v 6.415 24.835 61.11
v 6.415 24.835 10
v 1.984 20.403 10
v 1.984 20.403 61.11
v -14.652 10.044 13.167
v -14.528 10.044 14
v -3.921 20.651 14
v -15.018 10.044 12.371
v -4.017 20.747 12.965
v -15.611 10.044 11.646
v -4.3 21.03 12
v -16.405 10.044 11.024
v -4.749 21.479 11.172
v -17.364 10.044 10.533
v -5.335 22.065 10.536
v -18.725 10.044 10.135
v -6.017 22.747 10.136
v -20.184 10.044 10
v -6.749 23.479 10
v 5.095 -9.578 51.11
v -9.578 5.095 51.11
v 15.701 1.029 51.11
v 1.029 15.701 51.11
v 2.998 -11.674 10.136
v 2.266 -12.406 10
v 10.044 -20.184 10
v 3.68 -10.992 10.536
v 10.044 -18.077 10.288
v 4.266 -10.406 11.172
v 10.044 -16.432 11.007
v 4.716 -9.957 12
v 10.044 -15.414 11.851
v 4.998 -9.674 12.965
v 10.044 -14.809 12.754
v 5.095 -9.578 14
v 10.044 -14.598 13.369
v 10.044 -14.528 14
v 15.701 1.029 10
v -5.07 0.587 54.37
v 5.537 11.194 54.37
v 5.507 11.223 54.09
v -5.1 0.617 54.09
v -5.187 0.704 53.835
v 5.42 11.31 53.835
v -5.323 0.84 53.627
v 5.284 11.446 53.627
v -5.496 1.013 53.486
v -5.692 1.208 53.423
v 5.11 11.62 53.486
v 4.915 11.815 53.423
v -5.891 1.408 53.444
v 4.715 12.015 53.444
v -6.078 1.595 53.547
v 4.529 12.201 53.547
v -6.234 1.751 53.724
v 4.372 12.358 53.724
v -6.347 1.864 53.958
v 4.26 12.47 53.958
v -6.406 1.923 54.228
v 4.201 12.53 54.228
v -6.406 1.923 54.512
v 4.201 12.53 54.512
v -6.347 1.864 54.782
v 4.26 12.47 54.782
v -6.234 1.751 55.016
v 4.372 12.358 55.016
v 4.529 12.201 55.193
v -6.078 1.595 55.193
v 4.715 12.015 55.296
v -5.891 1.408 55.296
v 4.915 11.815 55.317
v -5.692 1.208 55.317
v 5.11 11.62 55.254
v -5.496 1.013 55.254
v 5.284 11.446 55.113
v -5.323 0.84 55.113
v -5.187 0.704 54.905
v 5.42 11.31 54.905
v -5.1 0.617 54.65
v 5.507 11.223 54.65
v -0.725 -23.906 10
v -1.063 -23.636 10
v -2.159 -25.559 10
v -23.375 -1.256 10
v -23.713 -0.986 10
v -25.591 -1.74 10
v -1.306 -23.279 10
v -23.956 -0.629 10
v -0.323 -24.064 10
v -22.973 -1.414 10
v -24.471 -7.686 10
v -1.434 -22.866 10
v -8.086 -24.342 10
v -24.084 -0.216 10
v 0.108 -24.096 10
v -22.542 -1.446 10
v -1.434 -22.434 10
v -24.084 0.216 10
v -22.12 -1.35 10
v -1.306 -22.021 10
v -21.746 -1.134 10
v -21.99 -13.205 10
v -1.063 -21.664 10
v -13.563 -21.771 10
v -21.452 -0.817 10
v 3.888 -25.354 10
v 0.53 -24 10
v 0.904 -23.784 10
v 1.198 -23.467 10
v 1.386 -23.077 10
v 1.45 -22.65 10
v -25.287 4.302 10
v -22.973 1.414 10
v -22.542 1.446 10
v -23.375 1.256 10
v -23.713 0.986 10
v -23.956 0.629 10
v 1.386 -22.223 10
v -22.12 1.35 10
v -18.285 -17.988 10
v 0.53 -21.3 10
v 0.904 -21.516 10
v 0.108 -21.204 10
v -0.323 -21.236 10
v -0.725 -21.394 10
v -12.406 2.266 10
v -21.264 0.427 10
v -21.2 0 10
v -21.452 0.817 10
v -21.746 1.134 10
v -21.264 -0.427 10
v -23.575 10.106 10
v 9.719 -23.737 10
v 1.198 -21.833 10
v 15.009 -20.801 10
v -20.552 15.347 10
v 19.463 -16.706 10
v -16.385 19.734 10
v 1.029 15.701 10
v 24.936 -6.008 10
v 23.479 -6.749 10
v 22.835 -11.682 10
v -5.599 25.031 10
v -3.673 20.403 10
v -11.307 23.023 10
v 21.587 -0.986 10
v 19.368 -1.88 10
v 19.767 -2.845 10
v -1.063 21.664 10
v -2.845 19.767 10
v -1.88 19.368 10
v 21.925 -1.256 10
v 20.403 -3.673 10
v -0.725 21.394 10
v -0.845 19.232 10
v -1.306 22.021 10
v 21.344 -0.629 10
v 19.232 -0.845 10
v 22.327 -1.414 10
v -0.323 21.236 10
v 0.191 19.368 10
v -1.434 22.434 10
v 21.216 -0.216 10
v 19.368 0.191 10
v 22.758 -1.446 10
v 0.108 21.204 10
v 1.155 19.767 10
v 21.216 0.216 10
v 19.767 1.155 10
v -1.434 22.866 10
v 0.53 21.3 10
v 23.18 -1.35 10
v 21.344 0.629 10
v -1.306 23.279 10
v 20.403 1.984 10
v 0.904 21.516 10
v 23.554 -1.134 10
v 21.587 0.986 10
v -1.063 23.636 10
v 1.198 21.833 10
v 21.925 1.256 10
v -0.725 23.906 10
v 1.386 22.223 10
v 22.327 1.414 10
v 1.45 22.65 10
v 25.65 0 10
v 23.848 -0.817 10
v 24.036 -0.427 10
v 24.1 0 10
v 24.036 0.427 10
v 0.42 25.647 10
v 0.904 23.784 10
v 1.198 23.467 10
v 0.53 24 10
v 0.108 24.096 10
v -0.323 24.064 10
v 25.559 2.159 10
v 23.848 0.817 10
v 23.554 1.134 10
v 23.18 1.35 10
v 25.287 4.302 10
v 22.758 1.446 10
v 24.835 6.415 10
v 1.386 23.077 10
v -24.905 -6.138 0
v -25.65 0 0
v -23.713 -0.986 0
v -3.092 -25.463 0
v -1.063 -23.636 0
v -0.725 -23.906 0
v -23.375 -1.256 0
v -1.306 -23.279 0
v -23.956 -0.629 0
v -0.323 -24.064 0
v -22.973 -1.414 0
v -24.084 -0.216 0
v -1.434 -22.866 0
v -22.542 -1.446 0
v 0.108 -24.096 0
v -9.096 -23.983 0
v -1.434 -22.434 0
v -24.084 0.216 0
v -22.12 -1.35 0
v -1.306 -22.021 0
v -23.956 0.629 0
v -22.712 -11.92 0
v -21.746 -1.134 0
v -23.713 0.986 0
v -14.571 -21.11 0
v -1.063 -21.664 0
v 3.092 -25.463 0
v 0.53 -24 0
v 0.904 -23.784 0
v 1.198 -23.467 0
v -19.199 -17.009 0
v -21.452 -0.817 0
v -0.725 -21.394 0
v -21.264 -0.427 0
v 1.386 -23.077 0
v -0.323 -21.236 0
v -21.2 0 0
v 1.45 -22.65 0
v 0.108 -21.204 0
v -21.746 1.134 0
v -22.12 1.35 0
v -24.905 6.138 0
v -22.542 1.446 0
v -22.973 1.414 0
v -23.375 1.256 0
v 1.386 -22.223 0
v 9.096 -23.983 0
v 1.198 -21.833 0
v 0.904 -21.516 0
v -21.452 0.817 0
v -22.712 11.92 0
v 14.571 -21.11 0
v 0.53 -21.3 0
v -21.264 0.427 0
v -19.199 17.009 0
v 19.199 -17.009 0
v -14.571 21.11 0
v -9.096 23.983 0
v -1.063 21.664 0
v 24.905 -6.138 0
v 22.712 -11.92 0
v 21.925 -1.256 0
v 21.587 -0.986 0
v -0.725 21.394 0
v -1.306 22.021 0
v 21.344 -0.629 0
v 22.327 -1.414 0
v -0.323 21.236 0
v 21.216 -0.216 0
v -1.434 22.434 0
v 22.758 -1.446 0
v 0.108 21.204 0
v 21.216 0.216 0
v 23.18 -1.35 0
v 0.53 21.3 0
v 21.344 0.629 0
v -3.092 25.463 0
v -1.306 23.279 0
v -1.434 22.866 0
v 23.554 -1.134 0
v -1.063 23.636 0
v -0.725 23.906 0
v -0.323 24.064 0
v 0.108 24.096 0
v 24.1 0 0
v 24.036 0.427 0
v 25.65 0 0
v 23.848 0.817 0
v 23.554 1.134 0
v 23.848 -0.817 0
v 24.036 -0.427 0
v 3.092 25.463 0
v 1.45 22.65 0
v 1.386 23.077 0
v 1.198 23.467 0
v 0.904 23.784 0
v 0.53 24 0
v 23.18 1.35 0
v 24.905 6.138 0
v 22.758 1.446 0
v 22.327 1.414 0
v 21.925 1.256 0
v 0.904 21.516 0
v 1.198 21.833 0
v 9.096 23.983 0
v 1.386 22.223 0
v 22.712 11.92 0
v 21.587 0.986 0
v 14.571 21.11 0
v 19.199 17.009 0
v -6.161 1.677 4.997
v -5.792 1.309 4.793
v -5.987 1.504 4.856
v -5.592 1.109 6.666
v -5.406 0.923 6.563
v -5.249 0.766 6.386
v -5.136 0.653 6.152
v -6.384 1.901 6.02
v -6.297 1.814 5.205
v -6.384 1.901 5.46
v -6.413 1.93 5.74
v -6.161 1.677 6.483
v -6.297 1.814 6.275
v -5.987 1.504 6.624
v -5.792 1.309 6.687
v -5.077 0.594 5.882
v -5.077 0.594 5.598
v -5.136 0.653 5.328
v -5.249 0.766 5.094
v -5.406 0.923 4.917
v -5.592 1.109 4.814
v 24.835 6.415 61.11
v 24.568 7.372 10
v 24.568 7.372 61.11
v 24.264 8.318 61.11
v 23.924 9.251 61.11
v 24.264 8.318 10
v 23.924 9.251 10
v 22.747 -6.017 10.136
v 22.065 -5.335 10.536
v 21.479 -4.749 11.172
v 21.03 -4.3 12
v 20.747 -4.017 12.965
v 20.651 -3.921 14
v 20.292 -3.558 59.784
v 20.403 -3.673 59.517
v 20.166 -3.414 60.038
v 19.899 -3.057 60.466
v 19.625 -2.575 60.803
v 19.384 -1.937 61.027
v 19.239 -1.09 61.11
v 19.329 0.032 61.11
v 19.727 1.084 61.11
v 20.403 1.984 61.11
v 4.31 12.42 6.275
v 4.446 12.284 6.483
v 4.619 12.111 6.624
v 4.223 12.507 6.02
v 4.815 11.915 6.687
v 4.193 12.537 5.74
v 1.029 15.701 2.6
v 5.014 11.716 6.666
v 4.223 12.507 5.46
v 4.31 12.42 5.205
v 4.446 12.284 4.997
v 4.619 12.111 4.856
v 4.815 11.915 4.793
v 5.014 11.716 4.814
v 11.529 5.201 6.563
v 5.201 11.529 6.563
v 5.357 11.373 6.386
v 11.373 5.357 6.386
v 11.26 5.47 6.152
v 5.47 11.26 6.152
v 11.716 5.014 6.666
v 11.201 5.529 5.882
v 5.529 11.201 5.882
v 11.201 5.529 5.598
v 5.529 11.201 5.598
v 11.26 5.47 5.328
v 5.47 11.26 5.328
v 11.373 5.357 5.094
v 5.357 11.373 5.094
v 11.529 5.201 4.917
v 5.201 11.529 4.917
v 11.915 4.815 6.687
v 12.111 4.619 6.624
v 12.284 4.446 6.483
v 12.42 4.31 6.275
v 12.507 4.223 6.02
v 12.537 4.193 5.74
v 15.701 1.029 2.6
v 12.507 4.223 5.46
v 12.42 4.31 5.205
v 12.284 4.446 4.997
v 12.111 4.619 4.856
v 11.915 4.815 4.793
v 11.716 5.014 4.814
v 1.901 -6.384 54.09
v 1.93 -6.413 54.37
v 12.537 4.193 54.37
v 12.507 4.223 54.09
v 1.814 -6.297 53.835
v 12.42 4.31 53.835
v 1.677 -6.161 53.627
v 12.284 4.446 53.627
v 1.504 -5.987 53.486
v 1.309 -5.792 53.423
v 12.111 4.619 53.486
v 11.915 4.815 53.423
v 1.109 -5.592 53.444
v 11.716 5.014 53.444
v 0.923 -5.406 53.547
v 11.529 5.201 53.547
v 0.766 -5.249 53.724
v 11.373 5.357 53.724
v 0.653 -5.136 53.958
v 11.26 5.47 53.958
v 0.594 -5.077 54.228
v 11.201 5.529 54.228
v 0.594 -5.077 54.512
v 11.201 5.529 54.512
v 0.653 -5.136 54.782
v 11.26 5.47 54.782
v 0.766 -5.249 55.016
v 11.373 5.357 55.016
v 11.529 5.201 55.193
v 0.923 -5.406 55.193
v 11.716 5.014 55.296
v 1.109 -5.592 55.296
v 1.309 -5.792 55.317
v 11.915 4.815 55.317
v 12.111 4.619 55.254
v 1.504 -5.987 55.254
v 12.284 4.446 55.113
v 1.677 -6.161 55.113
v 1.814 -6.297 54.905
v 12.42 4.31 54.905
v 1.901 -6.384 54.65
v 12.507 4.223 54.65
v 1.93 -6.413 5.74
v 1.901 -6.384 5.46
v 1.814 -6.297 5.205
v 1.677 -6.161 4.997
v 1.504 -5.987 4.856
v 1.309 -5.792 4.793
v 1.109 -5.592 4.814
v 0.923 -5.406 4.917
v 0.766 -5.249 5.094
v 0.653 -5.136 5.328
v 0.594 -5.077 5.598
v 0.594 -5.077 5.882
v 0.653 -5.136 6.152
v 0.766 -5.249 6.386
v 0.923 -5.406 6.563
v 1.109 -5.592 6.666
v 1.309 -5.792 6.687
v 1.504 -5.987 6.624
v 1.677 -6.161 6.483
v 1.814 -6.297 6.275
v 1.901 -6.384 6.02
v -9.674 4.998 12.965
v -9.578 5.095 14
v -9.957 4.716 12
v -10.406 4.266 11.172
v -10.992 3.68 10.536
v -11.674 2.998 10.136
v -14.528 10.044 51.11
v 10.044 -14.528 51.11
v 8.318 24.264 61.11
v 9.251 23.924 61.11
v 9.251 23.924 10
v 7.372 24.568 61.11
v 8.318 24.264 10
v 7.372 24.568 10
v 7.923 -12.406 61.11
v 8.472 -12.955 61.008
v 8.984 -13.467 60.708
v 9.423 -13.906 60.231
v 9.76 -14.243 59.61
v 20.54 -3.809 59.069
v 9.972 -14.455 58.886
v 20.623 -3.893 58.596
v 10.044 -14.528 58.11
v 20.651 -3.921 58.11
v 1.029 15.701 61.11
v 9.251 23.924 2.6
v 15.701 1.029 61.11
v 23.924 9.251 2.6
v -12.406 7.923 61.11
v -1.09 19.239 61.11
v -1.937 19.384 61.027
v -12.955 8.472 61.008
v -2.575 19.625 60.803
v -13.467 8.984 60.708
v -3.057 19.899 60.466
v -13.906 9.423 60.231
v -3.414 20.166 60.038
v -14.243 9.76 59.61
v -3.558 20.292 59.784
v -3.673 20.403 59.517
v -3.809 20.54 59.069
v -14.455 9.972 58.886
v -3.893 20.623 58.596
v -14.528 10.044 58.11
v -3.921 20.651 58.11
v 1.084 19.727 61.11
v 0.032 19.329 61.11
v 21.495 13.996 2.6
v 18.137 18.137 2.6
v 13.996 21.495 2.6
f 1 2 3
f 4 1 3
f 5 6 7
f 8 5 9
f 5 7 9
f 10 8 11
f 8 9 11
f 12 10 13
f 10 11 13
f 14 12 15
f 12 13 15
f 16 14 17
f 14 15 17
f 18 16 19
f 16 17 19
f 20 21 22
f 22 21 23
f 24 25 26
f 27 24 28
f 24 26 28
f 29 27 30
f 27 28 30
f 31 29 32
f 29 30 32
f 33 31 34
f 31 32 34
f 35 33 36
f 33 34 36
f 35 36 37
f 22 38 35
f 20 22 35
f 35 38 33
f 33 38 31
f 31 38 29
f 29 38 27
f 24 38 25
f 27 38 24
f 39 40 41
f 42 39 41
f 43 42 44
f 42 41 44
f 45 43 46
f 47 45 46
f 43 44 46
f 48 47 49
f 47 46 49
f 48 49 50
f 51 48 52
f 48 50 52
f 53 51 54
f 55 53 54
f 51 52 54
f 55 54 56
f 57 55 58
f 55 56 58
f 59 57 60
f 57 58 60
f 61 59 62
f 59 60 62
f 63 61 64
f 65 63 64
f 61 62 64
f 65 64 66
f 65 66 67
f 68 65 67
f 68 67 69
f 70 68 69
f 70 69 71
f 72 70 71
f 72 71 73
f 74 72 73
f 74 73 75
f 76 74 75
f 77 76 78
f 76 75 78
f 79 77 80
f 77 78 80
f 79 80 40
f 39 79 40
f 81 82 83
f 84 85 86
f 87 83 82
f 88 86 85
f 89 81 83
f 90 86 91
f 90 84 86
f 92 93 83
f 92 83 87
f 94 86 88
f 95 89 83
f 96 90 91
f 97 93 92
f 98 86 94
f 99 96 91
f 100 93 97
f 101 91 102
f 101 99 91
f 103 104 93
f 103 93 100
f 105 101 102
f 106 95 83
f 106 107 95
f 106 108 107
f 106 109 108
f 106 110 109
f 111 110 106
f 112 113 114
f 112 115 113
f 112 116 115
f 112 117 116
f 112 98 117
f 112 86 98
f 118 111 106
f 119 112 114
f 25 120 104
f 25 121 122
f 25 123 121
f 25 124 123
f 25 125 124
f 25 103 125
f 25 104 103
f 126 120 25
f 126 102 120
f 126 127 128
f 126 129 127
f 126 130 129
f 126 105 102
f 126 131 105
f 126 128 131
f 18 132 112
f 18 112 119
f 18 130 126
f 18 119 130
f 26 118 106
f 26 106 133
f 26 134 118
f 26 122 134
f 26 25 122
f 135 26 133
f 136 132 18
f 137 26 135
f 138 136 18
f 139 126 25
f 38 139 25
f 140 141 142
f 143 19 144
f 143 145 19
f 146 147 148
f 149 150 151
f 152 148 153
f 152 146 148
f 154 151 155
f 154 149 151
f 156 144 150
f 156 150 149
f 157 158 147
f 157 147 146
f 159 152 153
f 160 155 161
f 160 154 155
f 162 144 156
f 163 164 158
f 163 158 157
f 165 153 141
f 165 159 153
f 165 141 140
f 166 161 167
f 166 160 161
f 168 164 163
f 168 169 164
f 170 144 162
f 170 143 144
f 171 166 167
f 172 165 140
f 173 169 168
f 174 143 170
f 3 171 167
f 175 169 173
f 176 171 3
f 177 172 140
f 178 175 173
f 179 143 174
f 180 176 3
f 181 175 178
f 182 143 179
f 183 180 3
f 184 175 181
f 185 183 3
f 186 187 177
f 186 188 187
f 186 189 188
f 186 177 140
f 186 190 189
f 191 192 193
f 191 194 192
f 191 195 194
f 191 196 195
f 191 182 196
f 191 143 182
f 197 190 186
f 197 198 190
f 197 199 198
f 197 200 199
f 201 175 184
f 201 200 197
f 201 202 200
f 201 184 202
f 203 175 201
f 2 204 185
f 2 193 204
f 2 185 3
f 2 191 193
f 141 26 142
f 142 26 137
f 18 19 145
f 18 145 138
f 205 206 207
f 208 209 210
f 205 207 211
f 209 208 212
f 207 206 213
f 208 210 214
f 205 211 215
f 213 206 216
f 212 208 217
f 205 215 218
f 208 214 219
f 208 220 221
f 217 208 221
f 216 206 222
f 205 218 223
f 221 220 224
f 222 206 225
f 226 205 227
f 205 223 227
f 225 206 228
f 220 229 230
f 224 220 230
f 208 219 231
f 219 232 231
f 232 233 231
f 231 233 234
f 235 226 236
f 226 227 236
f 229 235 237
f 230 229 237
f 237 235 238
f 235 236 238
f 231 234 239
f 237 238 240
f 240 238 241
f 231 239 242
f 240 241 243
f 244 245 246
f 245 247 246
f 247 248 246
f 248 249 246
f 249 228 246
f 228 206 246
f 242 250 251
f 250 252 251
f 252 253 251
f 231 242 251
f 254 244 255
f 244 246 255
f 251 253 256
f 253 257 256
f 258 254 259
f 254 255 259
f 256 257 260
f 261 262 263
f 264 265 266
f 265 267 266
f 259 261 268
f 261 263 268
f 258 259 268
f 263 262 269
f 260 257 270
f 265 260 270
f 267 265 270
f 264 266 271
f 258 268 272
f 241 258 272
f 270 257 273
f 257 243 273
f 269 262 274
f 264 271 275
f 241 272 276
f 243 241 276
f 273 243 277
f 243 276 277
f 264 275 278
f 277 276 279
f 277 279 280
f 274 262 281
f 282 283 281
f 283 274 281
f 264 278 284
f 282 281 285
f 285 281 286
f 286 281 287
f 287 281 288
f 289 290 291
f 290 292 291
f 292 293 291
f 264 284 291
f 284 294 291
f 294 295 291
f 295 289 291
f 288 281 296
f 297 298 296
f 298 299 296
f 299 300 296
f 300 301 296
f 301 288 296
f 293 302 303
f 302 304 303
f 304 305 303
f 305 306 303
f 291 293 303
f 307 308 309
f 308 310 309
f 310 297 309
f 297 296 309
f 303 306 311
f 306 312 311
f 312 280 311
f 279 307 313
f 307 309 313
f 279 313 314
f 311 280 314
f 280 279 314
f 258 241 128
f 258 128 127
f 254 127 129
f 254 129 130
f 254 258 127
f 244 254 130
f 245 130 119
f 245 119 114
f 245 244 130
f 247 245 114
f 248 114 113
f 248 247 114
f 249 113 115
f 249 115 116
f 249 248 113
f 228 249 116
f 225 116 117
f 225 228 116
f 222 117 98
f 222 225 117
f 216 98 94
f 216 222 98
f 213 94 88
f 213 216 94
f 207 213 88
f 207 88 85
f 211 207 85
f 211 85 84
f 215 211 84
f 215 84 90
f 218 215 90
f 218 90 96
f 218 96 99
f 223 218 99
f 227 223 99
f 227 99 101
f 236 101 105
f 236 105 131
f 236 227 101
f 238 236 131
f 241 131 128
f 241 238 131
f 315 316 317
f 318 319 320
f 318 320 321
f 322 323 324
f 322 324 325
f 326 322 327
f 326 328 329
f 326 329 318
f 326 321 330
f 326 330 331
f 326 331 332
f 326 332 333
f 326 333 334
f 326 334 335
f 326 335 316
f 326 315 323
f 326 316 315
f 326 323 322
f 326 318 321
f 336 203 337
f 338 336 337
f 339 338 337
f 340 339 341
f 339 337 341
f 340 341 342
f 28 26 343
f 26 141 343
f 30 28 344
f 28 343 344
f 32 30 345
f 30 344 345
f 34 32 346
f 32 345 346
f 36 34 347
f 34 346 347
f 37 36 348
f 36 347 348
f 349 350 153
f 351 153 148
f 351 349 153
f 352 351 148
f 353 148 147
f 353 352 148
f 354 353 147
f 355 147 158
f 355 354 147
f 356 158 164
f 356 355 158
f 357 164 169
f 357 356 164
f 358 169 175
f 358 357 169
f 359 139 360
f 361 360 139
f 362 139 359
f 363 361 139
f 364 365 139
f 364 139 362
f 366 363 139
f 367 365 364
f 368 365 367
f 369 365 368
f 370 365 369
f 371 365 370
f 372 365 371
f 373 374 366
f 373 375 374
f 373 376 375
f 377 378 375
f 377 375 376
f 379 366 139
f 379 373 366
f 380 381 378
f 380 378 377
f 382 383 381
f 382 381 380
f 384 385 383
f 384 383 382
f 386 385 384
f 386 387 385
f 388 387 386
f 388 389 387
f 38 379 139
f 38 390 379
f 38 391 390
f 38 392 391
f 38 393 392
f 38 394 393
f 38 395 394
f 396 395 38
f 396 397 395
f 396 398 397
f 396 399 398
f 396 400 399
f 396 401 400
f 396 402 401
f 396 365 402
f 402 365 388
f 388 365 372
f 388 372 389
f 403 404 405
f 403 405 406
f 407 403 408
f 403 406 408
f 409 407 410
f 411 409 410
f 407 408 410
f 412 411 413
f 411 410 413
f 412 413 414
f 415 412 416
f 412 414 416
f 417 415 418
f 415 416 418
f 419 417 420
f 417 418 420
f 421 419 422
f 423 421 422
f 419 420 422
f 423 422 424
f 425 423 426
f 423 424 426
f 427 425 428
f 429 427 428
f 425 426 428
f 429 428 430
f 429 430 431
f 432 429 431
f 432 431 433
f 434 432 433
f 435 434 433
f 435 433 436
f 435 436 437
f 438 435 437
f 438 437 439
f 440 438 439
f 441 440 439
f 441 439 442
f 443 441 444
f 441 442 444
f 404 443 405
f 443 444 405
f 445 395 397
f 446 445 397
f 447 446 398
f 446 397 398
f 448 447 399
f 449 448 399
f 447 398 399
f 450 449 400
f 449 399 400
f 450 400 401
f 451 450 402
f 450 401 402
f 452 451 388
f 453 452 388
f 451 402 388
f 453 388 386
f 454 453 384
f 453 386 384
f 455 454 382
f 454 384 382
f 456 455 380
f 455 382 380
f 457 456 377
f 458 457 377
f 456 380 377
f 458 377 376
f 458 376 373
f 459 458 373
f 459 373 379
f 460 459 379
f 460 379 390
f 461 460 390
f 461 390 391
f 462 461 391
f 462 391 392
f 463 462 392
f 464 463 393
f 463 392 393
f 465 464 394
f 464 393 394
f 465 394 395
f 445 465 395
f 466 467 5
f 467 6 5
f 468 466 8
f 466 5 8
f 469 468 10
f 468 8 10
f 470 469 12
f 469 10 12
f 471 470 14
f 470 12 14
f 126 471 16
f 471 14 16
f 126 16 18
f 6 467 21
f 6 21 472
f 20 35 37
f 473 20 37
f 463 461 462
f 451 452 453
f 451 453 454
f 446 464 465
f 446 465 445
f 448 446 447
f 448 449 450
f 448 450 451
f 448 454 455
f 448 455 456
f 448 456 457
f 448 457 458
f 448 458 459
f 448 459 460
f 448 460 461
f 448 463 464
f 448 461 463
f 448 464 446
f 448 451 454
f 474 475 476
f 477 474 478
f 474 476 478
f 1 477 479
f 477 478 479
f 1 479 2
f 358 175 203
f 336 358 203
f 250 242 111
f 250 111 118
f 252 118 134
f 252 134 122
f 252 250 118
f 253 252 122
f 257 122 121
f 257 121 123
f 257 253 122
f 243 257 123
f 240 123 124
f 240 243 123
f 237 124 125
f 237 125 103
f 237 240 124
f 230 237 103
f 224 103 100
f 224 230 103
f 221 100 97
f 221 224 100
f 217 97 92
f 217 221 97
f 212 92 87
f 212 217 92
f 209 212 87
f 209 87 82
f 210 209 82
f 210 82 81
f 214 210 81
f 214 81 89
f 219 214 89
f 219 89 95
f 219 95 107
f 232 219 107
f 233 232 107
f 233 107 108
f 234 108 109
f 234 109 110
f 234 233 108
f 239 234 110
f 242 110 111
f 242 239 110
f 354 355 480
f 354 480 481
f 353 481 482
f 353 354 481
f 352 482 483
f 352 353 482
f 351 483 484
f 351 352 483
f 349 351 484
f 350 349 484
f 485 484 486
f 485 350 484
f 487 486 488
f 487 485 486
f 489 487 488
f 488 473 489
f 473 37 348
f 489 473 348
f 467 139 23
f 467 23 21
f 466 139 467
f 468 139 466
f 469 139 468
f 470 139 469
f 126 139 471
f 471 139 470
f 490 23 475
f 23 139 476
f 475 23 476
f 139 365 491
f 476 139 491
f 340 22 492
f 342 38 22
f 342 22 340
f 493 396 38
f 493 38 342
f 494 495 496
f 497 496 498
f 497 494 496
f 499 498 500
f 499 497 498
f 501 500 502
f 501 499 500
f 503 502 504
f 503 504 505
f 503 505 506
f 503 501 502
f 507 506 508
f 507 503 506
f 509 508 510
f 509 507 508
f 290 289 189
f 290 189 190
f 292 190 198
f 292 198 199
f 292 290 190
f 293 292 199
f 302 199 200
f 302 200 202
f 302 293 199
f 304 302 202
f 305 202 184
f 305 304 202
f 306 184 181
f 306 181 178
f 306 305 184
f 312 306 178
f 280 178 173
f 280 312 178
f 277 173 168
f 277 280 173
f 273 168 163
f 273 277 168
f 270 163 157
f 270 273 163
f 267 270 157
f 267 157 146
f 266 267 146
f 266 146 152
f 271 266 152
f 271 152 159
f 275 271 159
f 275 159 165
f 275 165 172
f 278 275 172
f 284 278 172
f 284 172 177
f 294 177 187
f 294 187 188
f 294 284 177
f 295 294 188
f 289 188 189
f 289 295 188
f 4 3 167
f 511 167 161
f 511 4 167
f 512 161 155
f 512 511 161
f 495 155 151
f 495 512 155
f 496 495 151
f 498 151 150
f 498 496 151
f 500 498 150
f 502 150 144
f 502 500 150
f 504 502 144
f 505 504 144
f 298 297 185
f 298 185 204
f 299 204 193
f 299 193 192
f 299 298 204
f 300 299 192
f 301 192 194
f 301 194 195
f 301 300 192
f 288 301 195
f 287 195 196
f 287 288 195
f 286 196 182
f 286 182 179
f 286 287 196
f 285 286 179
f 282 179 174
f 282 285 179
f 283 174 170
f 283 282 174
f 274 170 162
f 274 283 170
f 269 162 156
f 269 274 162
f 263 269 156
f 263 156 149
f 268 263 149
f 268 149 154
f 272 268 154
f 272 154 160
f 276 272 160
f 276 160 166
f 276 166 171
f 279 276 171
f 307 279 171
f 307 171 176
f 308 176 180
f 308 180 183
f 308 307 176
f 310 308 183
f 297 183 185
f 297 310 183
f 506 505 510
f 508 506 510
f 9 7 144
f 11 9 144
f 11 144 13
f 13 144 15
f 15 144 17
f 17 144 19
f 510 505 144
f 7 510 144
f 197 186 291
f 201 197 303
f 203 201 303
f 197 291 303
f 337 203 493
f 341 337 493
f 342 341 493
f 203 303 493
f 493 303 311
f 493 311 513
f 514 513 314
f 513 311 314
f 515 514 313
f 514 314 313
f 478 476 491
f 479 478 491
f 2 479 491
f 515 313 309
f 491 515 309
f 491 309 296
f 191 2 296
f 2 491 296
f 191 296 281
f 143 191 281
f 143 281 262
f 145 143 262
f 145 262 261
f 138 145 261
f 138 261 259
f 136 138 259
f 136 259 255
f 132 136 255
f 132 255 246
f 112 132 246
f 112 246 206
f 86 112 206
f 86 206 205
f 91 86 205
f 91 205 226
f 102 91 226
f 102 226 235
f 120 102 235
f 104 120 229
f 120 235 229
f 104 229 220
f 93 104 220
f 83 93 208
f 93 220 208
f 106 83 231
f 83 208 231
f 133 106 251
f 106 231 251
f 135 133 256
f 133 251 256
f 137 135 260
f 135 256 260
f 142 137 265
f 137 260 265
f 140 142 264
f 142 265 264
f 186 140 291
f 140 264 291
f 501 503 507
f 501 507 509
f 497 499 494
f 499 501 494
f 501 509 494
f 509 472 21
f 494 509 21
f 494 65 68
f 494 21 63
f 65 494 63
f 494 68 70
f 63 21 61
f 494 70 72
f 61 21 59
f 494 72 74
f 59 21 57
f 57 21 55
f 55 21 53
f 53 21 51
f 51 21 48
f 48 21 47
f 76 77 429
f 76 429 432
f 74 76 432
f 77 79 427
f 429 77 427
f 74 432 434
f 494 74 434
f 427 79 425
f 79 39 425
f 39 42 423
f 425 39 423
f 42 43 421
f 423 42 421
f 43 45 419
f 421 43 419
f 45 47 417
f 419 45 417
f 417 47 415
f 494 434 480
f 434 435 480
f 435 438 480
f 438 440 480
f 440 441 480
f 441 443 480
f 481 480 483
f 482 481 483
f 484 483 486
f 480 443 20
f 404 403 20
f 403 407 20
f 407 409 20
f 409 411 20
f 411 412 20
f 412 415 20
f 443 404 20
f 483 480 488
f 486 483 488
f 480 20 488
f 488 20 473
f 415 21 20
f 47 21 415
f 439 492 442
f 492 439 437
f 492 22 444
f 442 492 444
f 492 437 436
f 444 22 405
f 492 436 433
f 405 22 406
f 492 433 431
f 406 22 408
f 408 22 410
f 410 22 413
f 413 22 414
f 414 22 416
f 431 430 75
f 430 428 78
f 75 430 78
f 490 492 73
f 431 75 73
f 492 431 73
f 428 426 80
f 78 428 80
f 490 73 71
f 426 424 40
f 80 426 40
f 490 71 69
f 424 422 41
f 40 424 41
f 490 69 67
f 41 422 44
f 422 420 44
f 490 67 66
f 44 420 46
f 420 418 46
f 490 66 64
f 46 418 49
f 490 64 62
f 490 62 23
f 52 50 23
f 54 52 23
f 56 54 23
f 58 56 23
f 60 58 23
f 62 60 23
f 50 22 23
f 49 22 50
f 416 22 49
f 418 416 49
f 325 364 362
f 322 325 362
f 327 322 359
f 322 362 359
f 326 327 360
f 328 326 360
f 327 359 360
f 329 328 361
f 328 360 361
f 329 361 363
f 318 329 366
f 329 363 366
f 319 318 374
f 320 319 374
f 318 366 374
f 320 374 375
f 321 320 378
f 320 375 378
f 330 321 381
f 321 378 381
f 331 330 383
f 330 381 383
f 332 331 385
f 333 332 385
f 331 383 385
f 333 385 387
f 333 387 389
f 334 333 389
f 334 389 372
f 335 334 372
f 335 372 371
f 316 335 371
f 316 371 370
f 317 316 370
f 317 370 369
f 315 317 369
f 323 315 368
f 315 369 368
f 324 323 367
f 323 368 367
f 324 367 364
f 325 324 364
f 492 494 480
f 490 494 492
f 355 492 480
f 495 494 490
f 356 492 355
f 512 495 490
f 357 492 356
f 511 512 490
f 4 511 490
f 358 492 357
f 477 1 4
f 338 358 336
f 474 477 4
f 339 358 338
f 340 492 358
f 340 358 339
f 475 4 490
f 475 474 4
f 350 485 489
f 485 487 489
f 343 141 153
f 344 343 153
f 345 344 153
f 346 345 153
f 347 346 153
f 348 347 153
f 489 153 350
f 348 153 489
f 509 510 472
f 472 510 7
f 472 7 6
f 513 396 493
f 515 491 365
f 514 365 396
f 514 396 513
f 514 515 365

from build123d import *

# Parameters (mm, degrees)
SKETCH1_R               = 25.65
SKETCH1_R_2             = 1.45
BOSS_EXTRUDE1_DEPTH     = 10
CUT_EXTRUDE2_DEPTH      = 38.627715849
CUT_EXTRUDE2_DEPTH_BACK = 7.4
SKETCH3_R               = 0.95
CUT_EXTRUDE3_DEPTH      = 15
BOSS_EXTRUDE2_DEPTH     = 41.11
BOSS_EXTRUDE3_DEPTH     = 10
SKETCH6_R               = 0.95
CUT_EXTRUDE4_DEPTH      = 15
FILLET1_R               = 4
BOSS_EXTRUDE4_DEPTH     = 51.11
FILLET2_R               = 4
FILLET3_R               = 3


with BuildPart() as part:
    # Sketch1 → Boss-Extrude1 (new body)
    with BuildSketch(Plane.XY):
        Circle(SKETCH1_R)
        with Locations((0, -22.65)):
            Circle(SKETCH1_R_2, mode=Mode.SUBTRACT)
        with Locations((22.65, 0)):
            Circle(SKETCH1_R_2, mode=Mode.SUBTRACT)
        with Locations((0, 22.65)):
            Circle(SKETCH1_R_2, mode=Mode.SUBTRACT)
        with Locations((-22.65, 0)):
            Circle(SKETCH1_R_2, mode=Mode.SUBTRACT)
    extrude(amount=BOSS_EXTRUDE1_DEPTH)

    # Sketch2 → Cut-Extrude2 (cut, two sides: drawn at the far end of the back side and taken through both)
    with BuildSketch(Plane.XY.offset(10).offset(-CUT_EXTRUDE2_DEPTH_BACK)):
        Polygon((102.061719716, 116.734185426), (9.251139978, 23.923605688), (1.028840367, 15.701306076), (15.701306076, 1.028840367), (23.923605688, 9.251139978), (116.734185426, 102.061719716), (302.355344902, 287.682879192), (287.682879192, 302.355344902), align=None)
    extrude(amount=CUT_EXTRUDE2_DEPTH + CUT_EXTRUDE2_DEPTH_BACK, mode=Mode.SUBTRACT)

    # Sketch3 → Cut-Extrude3 (cut)
    with BuildSketch(Plane(origin=(8.365073221, 8.365073221, 0), x_dir=(0, 0, -1), z_dir=(0.7071067811865477, 0.7071067811865475, 0))):
        with Locations(Location((-5.74, 4.95, 0), (0, 0, 90))):
            Circle(SKETCH3_R)
        with Locations(Location((-5.74, -4.95, 0), (0, 0, 270))):
            Circle(SKETCH3_R)
    extrude(amount=-CUT_EXTRUDE3_DEPTH, mode=Mode.SUBTRACT)

    # Sketch4 → Boss-Extrude2 (add)
    with BuildSketch(Plane.XY.offset(10)):
        Polygon((-3.920907102, 20.651053545), (1.028840367, 15.701306076), (-9.577761351, 5.094704358), (-14.527508819, 10.044451827), align=None)
        Polygon((15.701306076, 1.028840367), (5.094704358, -9.577761351), (10.044451827, -14.527508819), (20.651053545, -3.920907102), align=None)
    extrude(amount=BOSS_EXTRUDE2_DEPTH)

    # Sketch5 → Boss-Extrude3 (add)
    with BuildSketch(Plane.XY.offset(51.11)):
        Polygon((-3.920907102, 20.651053545), (-14.527508819, 10.044451827), (10.044451827, -14.527508819), (20.651053545, -3.920907102), align=None)
    extrude(amount=BOSS_EXTRUDE3_DEPTH)

    # Sketch6 → Cut-Extrude4 (cut)
    with BuildSketch(Plane(origin=(8.365073221, 8.365073221, 0), x_dir=(0, 0, -1), z_dir=(0.7071067811865471, 0.707106781186548, 0))):
        with Locations(Location((-5.74, -4.95, 0), (0, 0, 270))):
            Circle(SKETCH6_R)
        with Locations(Location((-5.74, 4.95, 0), (0, 0, 90))):
            Circle(SKETCH6_R)
        with Locations(Location((-54.37, -4.95, 0), (0, 0, 270))):
            Circle(SKETCH6_R)
        with Locations(Location((-54.37, 4.95, 0), (0, 0, 270))):
            Circle(SKETCH6_R)
    extrude(amount=-CUT_EXTRUDE4_DEPTH, mode=Mode.SUBTRACT)

    # Fillet1
    fillet1_edges = [part.edges().sort_by_distance(p)[0] for p in [
        (-9.224207961, 15.347752686, 10),
        (-12.052635085, 7.569578093, 10),
        (7.569578093, -12.052635085, 10),
        (15.347752686, -9.224207961, 10),
    ]]
    fillet(fillet1_edges, radius=FILLET1_R)

    # Sketch7 → Boss-Extrude4 (add)
    with BuildSketch(Plane.XY.offset(10)):
        with BuildLine():
            Line((6.41546388, 24.834740248), (-0.844564963, 17.574711406))
            Line((-0.844564963, 17.574711406), (1.028840367, 15.701306076))
            Line((1.028840367, 15.701306076), (9.251139978, 23.923605688))
            ThreePointArc((9.251139978, 23.923605688), (7.846538132, 24.420367306), (6.41546388, 24.834740248))
        make_face()
        with BuildLine():
            Line((17.574711406, -0.844564963), (24.834740248, 6.41546388))
            ThreePointArc((24.834740248, 6.41546388), (24.420367306, 7.846538132), (23.923605688, 9.251139978))
            Line((23.923605688, 9.251139978), (15.701306076, 1.028840367))
            Line((15.701306076, 1.028840367), (17.574711406, -0.844564963))
        make_face()
    extrude(amount=BOSS_EXTRUDE4_DEPTH)

    # Fillet2
    fillet2_edges = [part.edges().sort_by_distance(p)[0] for p in [
        (-0.844564963, 17.574711406, 35.555),
        (17.574711406, -0.844564963, 35.555),
    ]]
    fillet(fillet2_edges, radius=FILLET2_R)

    # Fillet3
    fillet3_edges = [part.edges().sort_by_distance(p)[0] for p in [
        (-9.224207961, 15.347752686, 61.11),
        (15.347752686, -9.224207961, 61.11),
    ]]
    fillet(fillet3_edges, radius=FILLET3_R)


solid = part.part
